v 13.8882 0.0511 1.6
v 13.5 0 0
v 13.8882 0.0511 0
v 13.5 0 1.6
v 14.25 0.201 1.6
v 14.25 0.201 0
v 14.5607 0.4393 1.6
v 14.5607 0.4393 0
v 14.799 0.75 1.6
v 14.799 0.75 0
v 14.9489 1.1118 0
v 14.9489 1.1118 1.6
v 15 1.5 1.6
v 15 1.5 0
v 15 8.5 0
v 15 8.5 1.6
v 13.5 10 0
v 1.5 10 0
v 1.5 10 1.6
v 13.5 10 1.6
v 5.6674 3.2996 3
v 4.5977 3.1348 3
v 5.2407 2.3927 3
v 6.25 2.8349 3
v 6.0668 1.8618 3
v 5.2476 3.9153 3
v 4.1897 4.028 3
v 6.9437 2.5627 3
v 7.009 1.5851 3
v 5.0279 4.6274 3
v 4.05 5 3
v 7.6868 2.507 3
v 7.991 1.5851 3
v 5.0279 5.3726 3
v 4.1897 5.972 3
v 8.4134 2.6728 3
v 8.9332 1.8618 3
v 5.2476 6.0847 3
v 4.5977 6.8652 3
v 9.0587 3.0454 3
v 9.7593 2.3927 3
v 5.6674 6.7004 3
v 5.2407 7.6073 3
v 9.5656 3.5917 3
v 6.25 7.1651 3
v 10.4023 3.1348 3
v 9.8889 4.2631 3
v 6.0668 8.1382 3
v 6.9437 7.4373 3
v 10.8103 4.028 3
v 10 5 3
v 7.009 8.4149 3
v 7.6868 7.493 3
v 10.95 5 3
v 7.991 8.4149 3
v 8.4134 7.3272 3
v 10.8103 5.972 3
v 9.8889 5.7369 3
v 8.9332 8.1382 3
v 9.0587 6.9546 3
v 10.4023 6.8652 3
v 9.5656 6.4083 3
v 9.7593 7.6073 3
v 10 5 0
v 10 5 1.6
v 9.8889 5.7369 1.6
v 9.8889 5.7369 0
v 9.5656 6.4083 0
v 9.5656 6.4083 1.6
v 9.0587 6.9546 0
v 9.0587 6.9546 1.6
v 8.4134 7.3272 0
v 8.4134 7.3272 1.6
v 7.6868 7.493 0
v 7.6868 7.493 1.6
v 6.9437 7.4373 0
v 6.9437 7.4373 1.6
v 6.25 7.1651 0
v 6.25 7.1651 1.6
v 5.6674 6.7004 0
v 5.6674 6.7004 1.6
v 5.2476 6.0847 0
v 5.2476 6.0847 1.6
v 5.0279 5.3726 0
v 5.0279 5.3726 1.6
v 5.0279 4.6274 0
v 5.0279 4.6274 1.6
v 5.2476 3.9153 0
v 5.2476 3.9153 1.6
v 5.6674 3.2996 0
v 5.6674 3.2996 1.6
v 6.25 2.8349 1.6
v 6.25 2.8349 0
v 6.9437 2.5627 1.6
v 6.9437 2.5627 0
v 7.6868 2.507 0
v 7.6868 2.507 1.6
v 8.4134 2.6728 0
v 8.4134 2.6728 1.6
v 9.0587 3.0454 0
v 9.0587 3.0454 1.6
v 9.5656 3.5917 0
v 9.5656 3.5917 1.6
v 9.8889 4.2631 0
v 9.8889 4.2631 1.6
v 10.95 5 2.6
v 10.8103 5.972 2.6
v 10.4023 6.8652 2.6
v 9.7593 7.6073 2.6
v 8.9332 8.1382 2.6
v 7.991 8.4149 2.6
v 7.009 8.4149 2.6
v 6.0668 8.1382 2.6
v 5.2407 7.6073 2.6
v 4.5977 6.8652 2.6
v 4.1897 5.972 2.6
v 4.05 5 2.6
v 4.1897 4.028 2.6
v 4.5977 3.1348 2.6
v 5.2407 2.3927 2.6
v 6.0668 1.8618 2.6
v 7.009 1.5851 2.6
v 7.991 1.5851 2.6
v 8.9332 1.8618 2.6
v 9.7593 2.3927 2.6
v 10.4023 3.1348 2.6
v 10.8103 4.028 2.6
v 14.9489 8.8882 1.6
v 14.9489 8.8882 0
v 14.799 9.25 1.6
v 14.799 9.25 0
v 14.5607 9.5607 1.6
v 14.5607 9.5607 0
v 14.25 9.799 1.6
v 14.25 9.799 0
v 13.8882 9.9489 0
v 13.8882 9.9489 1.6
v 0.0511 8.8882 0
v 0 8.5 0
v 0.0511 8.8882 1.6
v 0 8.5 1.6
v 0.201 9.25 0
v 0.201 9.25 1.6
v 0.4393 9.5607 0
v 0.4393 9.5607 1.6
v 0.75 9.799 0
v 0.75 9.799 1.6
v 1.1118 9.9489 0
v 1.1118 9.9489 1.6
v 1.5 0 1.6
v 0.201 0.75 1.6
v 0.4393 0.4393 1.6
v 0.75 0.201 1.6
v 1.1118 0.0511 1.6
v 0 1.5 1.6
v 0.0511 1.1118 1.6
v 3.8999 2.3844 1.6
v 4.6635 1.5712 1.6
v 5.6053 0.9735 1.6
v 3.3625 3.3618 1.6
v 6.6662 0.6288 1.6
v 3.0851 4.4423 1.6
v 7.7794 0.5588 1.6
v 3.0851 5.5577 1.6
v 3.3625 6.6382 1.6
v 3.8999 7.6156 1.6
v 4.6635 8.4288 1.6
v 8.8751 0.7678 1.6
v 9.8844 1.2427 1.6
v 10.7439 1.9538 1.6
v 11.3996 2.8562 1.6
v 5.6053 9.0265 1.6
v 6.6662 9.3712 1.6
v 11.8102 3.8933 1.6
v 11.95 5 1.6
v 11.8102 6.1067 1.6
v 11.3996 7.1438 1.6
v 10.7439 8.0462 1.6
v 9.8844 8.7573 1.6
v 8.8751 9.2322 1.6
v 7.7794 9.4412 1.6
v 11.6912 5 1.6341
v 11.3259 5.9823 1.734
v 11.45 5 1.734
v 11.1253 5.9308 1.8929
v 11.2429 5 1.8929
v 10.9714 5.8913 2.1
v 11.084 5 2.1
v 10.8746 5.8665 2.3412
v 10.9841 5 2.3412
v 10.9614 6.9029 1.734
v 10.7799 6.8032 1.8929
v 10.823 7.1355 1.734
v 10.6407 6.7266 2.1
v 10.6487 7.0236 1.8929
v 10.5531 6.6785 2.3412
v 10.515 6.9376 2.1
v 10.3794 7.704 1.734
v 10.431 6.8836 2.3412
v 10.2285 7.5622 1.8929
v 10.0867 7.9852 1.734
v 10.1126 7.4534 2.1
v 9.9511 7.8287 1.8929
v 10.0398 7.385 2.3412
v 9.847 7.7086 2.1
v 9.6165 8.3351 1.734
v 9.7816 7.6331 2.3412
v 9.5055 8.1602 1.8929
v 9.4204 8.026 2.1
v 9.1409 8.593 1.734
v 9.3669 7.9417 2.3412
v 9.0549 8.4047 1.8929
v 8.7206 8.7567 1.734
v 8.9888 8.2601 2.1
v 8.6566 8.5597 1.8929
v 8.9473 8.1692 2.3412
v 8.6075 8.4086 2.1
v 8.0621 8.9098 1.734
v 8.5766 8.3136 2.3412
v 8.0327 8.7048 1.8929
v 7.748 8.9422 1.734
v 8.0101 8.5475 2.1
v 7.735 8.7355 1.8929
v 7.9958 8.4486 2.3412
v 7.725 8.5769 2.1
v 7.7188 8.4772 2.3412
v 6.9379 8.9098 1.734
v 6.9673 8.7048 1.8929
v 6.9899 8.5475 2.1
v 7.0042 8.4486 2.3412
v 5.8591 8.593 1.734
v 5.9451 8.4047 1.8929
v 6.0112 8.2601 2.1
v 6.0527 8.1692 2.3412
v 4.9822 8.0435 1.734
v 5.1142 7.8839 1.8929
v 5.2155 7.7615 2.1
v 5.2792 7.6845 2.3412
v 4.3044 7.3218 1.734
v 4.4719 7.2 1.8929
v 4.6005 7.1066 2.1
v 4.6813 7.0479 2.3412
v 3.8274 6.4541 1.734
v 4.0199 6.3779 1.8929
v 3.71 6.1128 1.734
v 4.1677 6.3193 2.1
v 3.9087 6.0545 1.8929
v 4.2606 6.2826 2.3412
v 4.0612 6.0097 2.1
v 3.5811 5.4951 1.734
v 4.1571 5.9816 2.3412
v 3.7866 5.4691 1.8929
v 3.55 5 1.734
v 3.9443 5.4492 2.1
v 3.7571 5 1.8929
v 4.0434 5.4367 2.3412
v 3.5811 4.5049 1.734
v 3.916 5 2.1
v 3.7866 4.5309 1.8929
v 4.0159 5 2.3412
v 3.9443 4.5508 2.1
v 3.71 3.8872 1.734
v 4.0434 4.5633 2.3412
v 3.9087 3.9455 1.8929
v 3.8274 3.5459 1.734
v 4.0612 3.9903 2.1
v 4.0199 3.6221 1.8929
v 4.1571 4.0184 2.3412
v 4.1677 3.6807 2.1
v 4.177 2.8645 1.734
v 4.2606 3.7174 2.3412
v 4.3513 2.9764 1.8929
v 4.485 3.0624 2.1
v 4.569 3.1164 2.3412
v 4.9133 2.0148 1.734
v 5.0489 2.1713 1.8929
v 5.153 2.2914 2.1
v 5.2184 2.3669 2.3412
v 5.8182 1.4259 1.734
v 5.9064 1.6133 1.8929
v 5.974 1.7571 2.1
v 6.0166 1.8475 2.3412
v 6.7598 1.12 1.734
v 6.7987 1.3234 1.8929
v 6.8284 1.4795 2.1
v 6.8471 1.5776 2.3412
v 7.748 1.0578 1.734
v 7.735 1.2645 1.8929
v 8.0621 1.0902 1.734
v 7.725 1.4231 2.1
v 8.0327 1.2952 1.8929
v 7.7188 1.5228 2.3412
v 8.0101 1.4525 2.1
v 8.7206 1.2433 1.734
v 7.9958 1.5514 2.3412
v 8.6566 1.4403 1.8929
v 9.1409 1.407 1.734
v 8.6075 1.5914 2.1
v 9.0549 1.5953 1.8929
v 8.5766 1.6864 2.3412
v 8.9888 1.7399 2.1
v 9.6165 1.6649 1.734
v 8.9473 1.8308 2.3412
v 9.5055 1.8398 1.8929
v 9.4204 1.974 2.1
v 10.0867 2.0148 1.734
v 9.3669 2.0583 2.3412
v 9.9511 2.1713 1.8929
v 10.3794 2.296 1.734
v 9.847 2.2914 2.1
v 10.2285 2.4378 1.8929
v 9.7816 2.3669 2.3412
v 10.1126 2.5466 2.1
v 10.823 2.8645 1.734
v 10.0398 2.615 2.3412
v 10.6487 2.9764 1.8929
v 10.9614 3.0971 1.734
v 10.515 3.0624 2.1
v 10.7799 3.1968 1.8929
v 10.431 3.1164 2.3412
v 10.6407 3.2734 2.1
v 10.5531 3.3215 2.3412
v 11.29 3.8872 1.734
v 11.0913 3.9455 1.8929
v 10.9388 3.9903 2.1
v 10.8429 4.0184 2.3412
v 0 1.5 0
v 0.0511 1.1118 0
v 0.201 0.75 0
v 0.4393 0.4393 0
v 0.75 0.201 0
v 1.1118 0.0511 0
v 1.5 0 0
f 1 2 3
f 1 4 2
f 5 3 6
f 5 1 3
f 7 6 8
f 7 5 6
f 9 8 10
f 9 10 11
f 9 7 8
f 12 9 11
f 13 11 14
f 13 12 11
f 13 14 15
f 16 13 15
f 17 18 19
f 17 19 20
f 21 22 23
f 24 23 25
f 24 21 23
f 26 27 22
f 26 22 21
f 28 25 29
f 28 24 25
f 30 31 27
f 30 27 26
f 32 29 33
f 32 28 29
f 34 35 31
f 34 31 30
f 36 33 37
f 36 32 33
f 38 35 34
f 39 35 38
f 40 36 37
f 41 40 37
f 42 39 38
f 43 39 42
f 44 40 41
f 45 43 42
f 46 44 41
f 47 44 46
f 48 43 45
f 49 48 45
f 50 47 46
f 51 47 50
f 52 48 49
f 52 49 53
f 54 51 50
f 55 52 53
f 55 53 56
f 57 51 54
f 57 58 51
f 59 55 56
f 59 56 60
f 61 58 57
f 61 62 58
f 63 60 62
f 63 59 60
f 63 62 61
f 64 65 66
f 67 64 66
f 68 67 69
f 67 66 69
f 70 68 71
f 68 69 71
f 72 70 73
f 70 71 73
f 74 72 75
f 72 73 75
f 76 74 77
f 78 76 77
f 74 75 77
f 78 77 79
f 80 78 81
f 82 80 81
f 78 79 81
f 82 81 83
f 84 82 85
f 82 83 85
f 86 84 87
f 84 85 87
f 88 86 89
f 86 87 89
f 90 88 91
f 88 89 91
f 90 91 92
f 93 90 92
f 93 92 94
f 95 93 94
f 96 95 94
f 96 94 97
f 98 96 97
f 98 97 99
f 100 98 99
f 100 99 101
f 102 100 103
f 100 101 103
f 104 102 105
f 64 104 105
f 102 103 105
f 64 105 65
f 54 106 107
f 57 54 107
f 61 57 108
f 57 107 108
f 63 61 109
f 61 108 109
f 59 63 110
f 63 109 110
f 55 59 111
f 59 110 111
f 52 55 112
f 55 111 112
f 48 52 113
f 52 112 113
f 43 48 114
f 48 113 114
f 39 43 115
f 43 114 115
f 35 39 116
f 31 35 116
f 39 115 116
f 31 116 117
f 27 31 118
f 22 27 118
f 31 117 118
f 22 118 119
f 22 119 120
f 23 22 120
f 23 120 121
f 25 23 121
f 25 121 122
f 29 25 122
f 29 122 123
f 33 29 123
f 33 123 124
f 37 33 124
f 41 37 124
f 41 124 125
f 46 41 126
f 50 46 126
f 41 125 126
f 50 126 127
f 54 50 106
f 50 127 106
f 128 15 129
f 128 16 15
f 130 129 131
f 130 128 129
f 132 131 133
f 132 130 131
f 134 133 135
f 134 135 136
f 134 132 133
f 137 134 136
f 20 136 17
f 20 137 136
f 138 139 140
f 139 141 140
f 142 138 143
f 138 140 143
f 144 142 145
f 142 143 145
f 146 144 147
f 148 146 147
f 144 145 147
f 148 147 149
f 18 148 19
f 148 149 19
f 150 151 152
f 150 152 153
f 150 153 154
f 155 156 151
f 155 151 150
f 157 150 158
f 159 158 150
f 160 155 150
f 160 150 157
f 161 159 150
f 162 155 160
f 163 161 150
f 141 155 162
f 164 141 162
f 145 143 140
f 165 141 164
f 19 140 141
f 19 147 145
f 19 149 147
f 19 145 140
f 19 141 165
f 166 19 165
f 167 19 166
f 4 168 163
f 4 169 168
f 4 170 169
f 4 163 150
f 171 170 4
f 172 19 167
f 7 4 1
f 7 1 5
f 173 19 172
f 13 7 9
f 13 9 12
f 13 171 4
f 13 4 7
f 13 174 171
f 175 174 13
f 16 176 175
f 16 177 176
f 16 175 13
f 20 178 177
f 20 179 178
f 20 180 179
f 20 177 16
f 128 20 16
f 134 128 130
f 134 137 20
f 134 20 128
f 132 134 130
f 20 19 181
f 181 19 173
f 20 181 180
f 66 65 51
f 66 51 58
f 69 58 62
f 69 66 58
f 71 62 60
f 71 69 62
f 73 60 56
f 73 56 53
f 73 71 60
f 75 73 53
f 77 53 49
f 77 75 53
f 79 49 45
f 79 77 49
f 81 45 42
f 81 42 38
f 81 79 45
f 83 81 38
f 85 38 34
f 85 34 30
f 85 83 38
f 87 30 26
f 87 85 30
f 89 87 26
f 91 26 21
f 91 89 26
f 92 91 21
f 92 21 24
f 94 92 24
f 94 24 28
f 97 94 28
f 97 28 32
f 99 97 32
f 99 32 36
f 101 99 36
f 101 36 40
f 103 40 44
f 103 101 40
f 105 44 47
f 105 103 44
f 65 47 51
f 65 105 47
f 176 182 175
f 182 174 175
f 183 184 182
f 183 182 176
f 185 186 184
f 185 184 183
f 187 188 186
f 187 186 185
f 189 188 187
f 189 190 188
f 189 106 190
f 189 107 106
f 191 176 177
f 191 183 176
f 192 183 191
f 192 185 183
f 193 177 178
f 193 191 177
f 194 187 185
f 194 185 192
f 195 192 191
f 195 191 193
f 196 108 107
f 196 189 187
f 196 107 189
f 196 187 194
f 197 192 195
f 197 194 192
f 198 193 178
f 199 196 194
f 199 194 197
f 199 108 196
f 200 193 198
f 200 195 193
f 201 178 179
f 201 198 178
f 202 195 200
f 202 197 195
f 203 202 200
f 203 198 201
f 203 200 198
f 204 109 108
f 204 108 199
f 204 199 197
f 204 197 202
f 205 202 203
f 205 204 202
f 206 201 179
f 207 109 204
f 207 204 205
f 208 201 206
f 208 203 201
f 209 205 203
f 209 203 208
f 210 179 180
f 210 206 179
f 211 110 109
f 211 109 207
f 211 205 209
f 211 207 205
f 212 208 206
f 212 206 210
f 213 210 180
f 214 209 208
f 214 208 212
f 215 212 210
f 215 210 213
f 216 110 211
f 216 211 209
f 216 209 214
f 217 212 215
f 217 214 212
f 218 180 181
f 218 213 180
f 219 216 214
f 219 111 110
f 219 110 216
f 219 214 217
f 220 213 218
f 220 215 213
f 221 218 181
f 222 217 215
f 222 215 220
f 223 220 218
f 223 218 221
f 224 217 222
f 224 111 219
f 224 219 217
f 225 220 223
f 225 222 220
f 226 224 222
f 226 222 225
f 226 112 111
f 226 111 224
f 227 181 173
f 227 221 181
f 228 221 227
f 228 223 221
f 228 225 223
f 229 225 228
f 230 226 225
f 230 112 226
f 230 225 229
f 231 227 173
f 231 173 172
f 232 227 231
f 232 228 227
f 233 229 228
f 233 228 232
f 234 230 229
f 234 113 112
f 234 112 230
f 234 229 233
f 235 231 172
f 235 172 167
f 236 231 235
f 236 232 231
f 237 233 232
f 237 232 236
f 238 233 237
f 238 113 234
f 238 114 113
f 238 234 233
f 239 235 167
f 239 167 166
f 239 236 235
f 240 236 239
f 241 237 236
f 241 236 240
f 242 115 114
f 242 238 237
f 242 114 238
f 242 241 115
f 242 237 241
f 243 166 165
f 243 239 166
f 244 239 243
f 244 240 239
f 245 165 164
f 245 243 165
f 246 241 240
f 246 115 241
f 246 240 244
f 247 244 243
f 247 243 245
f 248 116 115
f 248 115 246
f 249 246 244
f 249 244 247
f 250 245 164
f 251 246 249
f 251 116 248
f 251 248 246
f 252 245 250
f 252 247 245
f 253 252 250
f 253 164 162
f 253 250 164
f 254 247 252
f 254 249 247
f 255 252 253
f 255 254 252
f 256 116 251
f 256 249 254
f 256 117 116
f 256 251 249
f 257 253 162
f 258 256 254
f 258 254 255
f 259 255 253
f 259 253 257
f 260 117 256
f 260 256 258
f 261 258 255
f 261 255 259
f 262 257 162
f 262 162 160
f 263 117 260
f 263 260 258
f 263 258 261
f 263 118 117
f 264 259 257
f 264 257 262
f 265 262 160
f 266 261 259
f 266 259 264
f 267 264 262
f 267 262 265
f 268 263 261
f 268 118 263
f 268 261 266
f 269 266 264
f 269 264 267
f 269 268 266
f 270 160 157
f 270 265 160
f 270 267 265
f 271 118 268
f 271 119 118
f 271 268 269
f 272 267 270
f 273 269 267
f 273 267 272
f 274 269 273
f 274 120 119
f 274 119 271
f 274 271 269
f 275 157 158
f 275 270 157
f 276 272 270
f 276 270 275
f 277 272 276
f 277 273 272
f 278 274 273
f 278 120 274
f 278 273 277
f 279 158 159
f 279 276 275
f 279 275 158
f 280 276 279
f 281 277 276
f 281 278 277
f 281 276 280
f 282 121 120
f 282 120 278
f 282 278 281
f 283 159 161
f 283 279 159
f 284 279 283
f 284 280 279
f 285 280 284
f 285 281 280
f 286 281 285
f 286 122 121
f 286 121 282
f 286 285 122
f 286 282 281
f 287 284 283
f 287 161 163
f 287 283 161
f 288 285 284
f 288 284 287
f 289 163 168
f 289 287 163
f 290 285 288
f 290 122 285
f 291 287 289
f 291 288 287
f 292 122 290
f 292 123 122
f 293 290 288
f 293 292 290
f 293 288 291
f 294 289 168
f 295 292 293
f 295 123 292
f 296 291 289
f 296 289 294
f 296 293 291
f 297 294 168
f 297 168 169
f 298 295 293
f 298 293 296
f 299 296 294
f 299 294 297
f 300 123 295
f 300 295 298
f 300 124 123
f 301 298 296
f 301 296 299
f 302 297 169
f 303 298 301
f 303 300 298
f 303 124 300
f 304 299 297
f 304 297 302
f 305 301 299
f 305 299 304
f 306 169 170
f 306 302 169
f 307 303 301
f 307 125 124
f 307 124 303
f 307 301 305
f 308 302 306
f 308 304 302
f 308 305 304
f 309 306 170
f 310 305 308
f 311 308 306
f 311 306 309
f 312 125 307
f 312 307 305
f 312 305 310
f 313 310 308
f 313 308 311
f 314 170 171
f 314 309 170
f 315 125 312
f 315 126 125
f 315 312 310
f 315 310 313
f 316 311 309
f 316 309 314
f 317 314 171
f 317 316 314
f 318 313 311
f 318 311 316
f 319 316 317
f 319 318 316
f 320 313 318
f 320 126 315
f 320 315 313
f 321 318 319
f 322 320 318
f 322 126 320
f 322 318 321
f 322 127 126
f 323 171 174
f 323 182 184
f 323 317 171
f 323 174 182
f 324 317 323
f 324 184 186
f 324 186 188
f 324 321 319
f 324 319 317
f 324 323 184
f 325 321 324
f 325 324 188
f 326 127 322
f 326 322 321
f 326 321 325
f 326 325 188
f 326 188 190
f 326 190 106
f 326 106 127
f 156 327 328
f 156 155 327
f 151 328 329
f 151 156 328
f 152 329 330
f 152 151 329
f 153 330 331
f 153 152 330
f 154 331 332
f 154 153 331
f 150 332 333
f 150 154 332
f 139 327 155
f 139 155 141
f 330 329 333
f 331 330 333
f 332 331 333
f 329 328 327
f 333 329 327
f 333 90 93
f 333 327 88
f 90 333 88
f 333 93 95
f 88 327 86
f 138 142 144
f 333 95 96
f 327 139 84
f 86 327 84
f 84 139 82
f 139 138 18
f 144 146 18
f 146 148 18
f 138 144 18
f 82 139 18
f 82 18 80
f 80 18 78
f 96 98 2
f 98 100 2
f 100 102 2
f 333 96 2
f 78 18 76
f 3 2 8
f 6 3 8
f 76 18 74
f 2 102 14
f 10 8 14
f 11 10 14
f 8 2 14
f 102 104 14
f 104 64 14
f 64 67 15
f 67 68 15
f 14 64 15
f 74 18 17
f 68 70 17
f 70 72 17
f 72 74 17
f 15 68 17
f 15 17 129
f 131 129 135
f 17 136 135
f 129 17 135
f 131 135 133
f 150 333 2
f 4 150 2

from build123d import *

# Parameters (mm, degrees)
SKETCH1_W               = 15
SKETCH1_H               = 10
BOSS_EXTRUDE1_DEPTH     = 1.6
FILLET1_R               = 1.5
SKETCH2_R               = 3.45
BOSS_EXTRUDE2_DEPTH     = 1.4
CUT_EXTRUDE1_DEPTH      = 1.4
CUT_EXTRUDE1_DEPTH_BACK = 1.6
SKETCH2_3_R             = 2.5
FILLET2_R               = 1


with BuildPart() as part:
    # Sketch1 → Boss-Extrude1 (new body)
    with BuildSketch(Plane.XY):
        with Locations((7.5, 5)):
            Rectangle(SKETCH1_W, SKETCH1_H)
    extrude(amount=BOSS_EXTRUDE1_DEPTH)

    # Fillet1
    fillet1_edges = [part.edges().sort_by_distance(p)[0] for p in [
        (15, 0, 0.8),
        (0, 0, 0.8),
        (0, 10, 0.8),
        (15, 10, 0.8),
    ]]
    fillet(fillet1_edges, radius=FILLET1_R)

    # Sketch2 → Boss-Extrude2 (add)
    with BuildSketch(Plane.XY.offset(1.6)):
        with Locations((7.5, 5)):
            Circle(SKETCH2_R)
    extrude(amount=BOSS_EXTRUDE2_DEPTH)

    # Sketch2<3> → Cut-Extrude1 (cut, two sides: drawn at the far end of the back side and taken through both)
    with BuildSketch(Plane.XY.offset(1.6).offset(-CUT_EXTRUDE1_DEPTH_BACK)):
        with Locations((7.5, 5)):
            Circle(SKETCH2_3_R)
    extrude(amount=CUT_EXTRUDE1_DEPTH + CUT_EXTRUDE1_DEPTH_BACK, mode=Mode.SUBTRACT)

    # Fillet2
    fillet2_edges = [part.edges().sort_by_distance(p)[0] for p in [
        (4.05, 5, 1.6),
    ]]
    fillet(fillet2_edges, radius=FILLET2_R)


solid = part.part
